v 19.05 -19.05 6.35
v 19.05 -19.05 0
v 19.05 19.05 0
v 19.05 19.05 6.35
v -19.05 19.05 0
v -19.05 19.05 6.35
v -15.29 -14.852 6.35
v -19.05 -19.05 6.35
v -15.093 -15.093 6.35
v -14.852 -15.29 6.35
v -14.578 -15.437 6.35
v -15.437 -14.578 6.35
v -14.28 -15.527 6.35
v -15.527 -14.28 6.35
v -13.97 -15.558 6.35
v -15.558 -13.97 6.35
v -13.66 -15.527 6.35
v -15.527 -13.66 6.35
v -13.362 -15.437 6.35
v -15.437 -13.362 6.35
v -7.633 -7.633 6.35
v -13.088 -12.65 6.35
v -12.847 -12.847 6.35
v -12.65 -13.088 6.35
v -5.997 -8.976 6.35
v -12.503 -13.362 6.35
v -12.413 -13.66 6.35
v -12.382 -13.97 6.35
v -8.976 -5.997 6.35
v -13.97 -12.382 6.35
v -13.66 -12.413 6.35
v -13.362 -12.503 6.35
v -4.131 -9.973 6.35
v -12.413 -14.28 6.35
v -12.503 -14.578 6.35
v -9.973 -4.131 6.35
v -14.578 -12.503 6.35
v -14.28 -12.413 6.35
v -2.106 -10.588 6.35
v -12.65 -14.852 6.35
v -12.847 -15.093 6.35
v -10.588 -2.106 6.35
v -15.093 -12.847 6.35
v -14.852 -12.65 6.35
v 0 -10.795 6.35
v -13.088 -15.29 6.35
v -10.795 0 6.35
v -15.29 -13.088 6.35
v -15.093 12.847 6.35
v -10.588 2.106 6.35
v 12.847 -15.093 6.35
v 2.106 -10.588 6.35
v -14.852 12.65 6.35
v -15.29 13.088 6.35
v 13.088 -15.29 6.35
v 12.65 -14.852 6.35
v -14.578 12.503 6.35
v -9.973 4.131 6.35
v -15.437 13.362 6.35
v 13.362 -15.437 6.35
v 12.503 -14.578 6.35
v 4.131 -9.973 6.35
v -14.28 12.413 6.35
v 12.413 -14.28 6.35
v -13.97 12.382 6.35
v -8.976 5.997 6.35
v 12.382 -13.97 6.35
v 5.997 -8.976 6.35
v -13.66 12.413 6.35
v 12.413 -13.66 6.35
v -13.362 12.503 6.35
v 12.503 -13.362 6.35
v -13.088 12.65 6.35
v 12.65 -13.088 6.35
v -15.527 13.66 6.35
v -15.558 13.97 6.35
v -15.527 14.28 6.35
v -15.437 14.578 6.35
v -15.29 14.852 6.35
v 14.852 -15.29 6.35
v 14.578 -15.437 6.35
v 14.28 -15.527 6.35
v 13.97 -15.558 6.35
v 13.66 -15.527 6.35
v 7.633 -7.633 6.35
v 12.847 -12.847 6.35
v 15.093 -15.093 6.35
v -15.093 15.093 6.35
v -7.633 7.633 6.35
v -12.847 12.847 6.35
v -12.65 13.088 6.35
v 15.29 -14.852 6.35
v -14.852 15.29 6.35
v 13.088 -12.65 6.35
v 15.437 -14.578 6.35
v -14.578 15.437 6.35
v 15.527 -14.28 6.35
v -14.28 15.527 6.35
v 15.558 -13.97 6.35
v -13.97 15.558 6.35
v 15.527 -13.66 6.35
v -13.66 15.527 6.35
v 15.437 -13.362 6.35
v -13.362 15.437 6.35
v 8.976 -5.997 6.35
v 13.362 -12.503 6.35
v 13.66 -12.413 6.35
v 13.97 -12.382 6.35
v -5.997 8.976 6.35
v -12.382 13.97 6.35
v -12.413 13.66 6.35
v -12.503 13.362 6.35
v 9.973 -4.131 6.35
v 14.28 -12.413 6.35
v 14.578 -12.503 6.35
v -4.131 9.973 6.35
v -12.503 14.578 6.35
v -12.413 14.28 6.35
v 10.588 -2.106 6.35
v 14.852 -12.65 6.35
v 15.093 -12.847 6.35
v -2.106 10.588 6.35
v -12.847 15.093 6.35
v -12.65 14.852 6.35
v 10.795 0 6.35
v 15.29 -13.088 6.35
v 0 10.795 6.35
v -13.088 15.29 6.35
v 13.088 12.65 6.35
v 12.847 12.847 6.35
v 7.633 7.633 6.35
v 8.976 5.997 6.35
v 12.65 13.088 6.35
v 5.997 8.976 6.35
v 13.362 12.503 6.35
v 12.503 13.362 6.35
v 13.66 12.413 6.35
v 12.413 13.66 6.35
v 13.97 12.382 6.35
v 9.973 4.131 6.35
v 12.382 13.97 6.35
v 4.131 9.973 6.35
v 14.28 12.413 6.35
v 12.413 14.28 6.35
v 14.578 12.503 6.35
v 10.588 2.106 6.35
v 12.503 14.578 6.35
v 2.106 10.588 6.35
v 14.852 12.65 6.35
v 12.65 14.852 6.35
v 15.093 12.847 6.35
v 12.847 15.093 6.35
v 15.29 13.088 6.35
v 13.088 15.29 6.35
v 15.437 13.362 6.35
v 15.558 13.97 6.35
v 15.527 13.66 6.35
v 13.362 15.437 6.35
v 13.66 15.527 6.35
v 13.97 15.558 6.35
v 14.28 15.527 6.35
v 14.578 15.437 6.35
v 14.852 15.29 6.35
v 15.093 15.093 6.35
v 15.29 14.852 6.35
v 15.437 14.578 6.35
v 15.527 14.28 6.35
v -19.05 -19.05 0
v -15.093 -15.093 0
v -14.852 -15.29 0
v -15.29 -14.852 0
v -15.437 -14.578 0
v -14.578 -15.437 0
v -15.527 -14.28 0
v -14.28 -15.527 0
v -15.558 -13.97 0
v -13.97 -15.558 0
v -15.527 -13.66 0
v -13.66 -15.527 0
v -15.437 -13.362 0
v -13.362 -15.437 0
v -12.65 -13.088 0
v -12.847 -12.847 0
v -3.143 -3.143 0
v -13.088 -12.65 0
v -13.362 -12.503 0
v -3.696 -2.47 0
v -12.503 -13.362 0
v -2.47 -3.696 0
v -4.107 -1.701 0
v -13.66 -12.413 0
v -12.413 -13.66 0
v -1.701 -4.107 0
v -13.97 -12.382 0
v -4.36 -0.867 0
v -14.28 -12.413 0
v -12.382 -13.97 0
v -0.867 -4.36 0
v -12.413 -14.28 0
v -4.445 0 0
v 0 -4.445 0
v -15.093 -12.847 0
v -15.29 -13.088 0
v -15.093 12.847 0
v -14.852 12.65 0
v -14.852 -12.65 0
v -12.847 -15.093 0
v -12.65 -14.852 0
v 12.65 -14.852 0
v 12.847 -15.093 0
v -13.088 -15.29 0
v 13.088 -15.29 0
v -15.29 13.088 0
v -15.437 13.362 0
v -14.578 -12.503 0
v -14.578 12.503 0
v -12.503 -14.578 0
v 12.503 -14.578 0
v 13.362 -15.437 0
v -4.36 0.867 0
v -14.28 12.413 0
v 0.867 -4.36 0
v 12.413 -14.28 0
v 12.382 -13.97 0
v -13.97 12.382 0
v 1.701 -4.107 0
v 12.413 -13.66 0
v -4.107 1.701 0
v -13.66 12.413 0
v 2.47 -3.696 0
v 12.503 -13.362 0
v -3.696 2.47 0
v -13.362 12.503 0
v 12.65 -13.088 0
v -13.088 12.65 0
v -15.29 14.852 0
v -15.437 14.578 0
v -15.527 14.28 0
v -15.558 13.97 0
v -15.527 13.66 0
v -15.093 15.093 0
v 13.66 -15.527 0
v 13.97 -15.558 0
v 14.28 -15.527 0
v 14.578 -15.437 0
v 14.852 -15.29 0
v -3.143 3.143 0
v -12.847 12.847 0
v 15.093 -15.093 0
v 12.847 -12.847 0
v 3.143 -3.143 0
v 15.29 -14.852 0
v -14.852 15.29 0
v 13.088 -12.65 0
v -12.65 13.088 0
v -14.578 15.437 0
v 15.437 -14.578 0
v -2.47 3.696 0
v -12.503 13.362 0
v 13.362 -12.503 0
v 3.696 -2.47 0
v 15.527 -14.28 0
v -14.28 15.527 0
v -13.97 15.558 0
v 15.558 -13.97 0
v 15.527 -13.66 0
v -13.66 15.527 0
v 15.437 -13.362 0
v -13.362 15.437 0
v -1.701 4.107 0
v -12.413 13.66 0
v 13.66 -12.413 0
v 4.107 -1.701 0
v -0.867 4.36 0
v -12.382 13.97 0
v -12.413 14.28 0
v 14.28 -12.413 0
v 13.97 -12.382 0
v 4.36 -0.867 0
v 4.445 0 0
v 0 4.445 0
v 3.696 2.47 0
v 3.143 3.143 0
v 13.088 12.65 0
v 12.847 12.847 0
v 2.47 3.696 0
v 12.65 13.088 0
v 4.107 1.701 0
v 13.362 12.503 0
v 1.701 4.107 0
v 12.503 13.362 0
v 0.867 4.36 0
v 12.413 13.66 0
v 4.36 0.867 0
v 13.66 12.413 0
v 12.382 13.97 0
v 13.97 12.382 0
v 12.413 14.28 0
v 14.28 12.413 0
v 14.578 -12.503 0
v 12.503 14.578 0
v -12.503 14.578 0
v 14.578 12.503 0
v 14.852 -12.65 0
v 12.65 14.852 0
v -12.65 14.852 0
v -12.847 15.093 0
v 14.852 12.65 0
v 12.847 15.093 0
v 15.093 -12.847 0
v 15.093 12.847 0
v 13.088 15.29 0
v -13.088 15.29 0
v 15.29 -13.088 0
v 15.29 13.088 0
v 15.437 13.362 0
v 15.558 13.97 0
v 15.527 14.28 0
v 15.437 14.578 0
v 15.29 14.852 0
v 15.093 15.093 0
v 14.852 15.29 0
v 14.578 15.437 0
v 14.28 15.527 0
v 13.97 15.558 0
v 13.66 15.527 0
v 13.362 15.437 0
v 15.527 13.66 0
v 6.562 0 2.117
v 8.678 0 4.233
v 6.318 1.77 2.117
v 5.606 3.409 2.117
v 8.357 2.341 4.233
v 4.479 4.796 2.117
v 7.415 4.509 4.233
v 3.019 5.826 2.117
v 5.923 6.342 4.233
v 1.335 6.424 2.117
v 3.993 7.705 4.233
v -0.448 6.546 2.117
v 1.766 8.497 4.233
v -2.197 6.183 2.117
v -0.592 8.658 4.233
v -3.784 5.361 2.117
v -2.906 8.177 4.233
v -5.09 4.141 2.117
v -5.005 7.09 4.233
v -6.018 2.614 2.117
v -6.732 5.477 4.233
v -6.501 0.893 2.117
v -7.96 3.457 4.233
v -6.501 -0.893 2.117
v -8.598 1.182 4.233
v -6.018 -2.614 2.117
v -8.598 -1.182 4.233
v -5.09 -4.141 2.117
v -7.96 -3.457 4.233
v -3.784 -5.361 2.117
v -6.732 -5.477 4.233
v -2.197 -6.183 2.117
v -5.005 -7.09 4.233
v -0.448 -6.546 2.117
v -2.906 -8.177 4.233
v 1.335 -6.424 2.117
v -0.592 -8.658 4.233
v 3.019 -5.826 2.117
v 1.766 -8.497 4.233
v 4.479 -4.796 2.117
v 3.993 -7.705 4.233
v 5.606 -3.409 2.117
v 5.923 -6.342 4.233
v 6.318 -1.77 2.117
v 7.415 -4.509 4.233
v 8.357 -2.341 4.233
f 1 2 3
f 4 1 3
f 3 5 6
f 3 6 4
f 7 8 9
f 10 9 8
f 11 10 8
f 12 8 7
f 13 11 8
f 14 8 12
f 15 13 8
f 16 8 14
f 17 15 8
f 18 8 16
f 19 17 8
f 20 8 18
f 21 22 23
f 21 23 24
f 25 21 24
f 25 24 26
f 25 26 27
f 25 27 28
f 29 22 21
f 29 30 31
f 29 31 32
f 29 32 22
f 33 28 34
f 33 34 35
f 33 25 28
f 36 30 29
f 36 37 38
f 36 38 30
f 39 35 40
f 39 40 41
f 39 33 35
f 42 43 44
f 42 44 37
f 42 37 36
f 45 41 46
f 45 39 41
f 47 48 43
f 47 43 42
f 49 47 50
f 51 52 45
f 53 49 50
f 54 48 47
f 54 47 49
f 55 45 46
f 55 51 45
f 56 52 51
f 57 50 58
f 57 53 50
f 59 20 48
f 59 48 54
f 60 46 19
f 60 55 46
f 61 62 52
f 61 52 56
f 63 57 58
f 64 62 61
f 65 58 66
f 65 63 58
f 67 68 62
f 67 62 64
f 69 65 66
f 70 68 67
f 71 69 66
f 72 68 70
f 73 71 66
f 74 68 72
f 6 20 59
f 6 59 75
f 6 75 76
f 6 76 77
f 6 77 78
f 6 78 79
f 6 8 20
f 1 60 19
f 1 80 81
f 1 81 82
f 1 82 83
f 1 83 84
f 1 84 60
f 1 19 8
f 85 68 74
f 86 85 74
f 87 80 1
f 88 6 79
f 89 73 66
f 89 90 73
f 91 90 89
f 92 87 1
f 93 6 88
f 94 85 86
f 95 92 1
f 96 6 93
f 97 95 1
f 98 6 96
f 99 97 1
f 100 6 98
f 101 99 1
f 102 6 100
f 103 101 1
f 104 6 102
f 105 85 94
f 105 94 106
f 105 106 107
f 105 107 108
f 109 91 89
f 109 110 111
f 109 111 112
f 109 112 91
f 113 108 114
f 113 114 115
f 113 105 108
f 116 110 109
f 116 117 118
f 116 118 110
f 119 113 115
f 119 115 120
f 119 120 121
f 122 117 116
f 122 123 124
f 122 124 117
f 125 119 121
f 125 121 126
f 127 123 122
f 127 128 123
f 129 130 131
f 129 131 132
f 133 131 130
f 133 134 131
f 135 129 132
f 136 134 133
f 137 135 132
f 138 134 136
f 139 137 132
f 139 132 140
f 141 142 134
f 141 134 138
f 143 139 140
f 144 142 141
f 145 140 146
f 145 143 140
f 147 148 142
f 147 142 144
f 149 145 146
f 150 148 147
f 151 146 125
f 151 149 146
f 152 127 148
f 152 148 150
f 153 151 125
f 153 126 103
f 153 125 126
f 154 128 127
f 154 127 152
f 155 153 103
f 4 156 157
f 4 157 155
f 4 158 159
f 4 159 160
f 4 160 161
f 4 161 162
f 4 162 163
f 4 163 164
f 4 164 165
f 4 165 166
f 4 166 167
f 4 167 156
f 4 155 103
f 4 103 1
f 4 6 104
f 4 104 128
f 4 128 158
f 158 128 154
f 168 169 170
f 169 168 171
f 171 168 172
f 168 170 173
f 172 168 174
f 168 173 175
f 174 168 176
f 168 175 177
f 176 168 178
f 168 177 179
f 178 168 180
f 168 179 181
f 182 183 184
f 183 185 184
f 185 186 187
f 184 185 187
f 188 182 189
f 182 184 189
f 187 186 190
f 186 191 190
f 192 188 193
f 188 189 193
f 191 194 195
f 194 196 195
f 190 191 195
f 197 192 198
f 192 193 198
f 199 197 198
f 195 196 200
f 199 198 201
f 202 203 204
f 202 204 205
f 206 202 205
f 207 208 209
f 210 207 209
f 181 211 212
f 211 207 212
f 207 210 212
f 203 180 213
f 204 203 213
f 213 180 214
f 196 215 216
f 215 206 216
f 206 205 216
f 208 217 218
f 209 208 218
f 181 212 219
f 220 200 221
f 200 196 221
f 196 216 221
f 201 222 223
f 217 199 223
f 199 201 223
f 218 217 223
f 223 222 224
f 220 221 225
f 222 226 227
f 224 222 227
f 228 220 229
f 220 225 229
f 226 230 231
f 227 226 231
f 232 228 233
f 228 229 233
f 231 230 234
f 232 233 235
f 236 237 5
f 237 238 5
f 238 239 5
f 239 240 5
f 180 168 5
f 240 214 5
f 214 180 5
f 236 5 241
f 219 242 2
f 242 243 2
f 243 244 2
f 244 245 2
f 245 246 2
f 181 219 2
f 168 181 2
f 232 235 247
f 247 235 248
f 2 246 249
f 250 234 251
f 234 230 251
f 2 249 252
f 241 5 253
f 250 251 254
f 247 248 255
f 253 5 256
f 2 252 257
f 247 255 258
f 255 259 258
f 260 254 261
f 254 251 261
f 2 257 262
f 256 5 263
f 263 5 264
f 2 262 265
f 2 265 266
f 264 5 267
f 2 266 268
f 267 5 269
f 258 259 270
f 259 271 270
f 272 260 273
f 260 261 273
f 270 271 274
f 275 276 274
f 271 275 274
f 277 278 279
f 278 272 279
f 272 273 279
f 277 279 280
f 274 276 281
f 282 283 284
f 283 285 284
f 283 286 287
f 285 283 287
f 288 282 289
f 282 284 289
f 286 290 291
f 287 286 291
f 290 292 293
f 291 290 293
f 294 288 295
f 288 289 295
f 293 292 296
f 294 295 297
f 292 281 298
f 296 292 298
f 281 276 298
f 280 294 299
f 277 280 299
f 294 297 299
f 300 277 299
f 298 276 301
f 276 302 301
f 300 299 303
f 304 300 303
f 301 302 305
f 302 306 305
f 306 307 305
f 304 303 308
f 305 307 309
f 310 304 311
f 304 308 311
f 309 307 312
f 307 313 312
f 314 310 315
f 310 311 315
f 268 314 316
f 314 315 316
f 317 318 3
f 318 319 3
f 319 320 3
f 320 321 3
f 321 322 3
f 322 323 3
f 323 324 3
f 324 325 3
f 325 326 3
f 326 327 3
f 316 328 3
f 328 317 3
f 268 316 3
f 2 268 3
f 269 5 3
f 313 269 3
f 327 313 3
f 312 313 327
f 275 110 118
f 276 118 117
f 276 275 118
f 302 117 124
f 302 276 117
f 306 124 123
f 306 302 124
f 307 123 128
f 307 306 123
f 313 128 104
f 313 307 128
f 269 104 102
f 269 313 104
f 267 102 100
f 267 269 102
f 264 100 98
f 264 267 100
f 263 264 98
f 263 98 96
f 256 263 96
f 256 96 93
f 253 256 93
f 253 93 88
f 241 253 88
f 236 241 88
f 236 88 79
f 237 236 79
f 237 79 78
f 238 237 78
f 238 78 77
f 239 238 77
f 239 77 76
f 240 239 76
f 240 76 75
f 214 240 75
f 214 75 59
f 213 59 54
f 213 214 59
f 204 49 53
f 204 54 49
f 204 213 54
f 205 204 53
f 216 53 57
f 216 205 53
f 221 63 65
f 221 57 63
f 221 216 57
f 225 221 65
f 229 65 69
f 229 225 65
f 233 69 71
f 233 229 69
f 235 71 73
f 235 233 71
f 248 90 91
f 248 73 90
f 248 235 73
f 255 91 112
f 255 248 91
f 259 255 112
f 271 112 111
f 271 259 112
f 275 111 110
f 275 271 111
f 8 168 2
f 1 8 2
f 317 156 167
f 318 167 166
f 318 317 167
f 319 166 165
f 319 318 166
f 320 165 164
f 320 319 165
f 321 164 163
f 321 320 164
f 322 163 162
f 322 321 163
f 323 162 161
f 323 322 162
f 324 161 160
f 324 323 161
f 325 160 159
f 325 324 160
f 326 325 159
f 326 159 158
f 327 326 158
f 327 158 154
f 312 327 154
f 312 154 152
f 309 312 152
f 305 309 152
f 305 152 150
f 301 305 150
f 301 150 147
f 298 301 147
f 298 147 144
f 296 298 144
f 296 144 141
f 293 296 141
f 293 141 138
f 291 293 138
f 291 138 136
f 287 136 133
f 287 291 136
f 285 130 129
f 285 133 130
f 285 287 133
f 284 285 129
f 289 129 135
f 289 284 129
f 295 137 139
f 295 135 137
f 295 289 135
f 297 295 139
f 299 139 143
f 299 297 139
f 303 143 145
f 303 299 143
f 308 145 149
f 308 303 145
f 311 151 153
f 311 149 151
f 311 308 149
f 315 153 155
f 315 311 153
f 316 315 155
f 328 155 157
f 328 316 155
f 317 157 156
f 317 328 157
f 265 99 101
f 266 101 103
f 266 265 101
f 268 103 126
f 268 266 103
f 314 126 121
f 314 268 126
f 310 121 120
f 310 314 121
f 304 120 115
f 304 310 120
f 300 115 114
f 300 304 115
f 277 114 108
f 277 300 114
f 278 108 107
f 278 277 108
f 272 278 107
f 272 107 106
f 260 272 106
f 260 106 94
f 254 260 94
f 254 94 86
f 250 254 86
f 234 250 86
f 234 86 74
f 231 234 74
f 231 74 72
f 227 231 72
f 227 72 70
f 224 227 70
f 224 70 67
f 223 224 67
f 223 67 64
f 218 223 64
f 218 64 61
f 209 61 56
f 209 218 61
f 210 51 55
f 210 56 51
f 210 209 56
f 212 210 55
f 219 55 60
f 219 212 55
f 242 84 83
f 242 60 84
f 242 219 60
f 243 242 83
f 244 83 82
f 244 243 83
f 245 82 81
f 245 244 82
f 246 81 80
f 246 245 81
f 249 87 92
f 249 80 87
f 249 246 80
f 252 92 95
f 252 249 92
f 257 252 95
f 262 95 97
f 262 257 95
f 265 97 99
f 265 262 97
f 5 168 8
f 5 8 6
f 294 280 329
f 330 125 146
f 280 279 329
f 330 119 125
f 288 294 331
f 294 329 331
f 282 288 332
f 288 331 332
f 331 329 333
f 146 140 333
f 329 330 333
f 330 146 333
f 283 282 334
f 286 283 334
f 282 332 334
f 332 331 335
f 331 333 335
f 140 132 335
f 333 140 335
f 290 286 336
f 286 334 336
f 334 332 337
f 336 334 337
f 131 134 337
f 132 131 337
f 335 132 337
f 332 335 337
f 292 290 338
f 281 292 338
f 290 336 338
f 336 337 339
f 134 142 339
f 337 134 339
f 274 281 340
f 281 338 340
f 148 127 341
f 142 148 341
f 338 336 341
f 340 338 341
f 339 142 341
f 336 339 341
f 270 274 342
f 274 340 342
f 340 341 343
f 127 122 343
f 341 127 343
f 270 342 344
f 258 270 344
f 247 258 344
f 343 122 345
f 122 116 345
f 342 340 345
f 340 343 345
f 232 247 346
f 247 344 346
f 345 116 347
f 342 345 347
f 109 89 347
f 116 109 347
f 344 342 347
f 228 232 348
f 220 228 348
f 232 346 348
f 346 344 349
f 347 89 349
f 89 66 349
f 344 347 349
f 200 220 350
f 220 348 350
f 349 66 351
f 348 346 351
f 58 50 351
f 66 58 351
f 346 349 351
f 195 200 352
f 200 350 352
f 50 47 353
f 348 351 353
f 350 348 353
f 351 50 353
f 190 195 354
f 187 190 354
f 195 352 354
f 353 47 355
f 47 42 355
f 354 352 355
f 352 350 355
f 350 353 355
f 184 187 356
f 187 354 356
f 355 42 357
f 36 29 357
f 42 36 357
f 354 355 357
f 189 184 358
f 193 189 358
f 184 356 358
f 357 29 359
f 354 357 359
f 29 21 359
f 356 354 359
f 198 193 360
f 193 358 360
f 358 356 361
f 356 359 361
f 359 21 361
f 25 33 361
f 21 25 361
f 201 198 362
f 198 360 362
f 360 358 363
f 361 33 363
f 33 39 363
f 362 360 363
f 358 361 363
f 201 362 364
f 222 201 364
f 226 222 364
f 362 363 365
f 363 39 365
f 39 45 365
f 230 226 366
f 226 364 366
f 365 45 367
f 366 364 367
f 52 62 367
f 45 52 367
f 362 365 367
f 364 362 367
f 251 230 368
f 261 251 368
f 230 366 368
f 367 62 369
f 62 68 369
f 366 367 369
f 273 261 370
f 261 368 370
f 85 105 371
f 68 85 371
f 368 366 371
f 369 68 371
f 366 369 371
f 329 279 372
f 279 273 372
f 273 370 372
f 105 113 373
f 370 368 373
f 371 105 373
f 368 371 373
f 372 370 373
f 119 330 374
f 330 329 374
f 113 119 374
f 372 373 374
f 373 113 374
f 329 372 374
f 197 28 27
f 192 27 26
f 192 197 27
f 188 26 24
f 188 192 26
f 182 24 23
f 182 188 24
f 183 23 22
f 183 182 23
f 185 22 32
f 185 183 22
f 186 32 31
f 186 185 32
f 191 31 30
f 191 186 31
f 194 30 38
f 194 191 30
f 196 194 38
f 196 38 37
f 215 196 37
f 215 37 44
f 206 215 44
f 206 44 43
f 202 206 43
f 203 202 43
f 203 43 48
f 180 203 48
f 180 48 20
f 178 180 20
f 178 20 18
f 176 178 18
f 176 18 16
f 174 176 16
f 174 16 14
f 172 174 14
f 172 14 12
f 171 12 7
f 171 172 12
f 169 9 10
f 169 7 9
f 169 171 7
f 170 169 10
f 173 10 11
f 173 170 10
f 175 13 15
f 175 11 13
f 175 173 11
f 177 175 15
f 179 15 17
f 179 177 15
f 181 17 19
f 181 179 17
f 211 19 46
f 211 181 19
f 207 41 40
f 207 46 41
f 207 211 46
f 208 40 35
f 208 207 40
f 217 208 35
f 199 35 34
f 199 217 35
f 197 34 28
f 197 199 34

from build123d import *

# Parameters (mm, degrees)
F0_W     = 38.1
F0_H     = 38.1
F1_DEPTH = 6.35
F2_R     = 4.445
F3_DEPTH = 25.4
F4_DEPTH = 6.35
F4_TAPER = -45
F5_R     = 1.5875
F6_DEPTH = 25.4


with BuildPart() as f1:
    # F0 (on Top) → F1 (new body)
    with BuildSketch(Plane.XY):
        Rectangle(F0_W, F0_H)
    extrude(amount=F1_DEPTH)

    # F2 (on Top) → F3 (cut)
    with BuildSketch(Plane.XY):
        Circle(F2_R)
    extrude(amount=F3_DEPTH, mode=Mode.SUBTRACT)

    # F2 (on Top) → F4 (cut)
    with BuildSketch(Plane.XY):
        Circle(F2_R)
    extrude(amount=F4_DEPTH, taper=F4_TAPER, mode=Mode.SUBTRACT)

    # F5 (on Top) → F6 (cut)
    with BuildSketch(Plane.XY):
        with Locations((13.97, -13.97)):
            Circle(F5_R)
        with Locations((13.97, 13.97)):
            Circle(F5_R)
        with Locations((-13.97, -13.97)):
            Circle(F5_R)
        with Locations((-13.97, 13.97)):
            Circle(F5_R)
    extrude(amount=F6_DEPTH, mode=Mode.SUBTRACT)


solid = f1.part
